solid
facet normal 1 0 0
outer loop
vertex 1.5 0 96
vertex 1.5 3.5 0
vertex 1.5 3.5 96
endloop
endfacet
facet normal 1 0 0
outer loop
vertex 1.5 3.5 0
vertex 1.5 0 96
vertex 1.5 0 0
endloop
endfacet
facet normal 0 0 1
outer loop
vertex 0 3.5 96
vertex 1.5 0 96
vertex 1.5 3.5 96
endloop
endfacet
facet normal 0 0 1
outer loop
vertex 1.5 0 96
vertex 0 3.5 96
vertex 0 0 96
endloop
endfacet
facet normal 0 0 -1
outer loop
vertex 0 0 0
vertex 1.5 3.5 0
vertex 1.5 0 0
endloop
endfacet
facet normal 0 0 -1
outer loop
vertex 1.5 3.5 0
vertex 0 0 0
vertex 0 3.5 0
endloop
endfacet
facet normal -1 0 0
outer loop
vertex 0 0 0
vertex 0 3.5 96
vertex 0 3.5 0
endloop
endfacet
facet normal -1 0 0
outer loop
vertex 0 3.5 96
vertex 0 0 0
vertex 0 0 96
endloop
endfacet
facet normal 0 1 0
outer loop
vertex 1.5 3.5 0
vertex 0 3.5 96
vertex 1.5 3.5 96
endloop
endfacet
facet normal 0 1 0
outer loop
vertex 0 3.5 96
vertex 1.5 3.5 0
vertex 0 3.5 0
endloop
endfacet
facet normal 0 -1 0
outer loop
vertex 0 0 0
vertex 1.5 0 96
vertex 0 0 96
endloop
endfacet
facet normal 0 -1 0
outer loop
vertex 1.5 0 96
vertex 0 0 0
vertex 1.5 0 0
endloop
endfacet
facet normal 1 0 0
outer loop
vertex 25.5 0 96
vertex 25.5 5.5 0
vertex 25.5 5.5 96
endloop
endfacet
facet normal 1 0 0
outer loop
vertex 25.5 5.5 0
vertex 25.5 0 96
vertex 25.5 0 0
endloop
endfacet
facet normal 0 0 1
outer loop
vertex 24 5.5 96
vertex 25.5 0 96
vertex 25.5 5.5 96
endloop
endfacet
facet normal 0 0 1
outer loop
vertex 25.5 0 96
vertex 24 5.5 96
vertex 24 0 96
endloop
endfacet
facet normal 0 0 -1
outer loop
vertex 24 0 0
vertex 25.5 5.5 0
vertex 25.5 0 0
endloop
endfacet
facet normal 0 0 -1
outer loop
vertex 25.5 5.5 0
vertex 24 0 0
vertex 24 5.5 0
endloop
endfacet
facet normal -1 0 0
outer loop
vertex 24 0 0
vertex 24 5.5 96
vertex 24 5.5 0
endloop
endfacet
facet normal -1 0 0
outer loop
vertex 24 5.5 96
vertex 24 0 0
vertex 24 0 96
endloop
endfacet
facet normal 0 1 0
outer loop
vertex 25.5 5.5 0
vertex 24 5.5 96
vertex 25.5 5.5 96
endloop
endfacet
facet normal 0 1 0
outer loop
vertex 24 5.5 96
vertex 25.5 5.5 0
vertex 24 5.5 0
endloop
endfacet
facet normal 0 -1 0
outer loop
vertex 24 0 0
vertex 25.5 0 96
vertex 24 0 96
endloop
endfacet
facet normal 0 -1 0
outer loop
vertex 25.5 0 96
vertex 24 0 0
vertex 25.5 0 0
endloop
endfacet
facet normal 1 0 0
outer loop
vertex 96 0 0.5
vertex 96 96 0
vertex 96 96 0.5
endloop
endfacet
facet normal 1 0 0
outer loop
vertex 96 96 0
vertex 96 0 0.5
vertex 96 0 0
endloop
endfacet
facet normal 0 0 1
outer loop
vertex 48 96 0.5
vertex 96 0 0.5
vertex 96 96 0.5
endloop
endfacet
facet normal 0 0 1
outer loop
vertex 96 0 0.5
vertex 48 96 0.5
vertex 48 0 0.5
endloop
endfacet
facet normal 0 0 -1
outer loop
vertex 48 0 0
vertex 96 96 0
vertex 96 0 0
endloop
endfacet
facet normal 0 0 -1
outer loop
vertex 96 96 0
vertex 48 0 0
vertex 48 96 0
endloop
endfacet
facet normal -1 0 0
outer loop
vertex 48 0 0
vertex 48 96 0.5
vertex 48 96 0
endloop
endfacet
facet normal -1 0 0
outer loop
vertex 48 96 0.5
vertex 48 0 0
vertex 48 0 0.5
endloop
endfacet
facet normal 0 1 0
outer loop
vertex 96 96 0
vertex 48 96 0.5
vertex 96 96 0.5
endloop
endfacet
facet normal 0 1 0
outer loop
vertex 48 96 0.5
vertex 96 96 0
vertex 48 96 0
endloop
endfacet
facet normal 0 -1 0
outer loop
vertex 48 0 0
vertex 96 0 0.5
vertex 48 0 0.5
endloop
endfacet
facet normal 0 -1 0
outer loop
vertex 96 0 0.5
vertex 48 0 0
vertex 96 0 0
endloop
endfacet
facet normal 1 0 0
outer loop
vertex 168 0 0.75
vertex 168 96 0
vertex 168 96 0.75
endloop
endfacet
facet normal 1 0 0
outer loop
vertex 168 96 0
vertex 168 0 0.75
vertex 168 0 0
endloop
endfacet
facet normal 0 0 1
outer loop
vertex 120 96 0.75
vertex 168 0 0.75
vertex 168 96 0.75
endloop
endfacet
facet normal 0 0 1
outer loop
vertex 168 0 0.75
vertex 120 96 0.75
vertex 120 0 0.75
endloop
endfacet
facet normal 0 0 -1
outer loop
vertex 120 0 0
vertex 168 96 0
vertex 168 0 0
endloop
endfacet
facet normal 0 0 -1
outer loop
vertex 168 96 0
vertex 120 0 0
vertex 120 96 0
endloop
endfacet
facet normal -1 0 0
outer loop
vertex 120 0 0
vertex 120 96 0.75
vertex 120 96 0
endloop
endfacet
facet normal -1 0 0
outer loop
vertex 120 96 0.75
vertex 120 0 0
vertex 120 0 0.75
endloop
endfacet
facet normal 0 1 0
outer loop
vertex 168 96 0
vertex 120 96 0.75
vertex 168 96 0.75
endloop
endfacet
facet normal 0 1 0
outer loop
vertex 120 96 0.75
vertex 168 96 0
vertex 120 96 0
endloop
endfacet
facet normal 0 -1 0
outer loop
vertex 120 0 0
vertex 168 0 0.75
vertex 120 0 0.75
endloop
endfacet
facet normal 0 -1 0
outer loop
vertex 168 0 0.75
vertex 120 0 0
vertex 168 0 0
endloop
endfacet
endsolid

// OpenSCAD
// file: utilities.scad
function feet(f) = f * 12;
function inches(i=0, f=0) = i+f; 
// main file
use <utilities.scad>;

// Stick
module 2x4x8(cut=[0, 0, 0]) {
    echo("2x4x8");
    cube([inches(1, 1/2) - cut[0], inches(3, 1/2) - cut[1], feet(8) - cut[2]]);
};

module 2x6x8(cut=[0, 0, 0]) {
    echo("2x6x8");
    cube([inches(1, 1/2) - cut[0], inches(5, 1/2) - cut[1], feet(8) - cut[2]]);
};

// Sheet
module 4x8x1_2(cut=[0, 0, 0]) {
    echo("4x8x1/2");
    cube([feet(4) - cut[0], feet(8) - cut[1], inches(0, 1/2) - cut[2]]);
};

module 4x8x3_4(cut=[0, 0, 0]) {
    echo("4x8x3/4");
    cube([feet(4) - cut[0], feet(8) - cut[1], inches(0, 3/4) - cut[2]]);
};

2x4x8();

translate([24, 0, 0])
    2x6x8();

translate([48, 0, 0])
    4x8x1_2();

translate([120, 0, 0])
    4x8x3_4();
